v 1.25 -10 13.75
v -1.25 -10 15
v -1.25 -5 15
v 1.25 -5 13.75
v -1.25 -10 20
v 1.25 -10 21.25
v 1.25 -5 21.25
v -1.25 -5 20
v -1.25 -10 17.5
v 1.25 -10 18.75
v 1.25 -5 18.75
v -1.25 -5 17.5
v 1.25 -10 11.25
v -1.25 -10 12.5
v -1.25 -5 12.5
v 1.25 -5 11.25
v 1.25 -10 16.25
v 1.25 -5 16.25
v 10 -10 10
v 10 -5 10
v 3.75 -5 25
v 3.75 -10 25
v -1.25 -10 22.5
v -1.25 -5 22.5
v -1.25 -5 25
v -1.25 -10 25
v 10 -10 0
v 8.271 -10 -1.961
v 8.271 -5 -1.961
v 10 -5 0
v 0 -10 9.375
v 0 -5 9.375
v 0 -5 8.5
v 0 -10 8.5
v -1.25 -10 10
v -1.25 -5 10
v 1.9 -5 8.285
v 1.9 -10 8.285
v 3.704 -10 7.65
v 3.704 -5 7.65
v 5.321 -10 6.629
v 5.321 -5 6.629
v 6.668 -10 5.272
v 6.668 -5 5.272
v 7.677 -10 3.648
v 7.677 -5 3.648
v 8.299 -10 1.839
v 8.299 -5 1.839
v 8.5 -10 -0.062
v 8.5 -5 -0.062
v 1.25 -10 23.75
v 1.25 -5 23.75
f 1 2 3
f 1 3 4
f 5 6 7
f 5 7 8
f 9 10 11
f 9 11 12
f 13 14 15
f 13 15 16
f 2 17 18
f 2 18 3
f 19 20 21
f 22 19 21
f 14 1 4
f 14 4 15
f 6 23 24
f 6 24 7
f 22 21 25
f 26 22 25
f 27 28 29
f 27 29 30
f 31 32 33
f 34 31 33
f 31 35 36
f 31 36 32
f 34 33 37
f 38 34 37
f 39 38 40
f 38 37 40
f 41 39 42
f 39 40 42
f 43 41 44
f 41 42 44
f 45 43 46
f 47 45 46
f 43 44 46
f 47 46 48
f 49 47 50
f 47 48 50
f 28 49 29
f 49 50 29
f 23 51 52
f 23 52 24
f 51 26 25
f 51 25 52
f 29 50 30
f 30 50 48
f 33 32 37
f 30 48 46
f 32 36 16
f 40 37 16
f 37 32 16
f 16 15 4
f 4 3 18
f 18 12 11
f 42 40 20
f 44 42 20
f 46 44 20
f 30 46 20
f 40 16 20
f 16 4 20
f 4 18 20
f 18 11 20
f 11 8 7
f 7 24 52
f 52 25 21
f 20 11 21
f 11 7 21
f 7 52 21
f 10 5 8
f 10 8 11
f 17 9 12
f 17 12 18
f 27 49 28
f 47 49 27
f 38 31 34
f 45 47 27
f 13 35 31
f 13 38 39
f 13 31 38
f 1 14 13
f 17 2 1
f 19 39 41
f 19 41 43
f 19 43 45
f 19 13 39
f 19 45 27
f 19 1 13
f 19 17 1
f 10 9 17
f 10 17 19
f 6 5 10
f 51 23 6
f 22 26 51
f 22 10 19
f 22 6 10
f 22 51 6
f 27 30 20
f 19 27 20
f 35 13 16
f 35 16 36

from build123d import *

# Parameters (mm, degrees)
F1_DEPTH      = 5
F3_DEPTH      = 5
F3_DEPTH_BACK = 5
F4_R          = 2.5
F5_DEPTH      = 5.001
F12_W         = 57.105852
F12_H         = 43.326581
F13_DEPTH     = 5


with BuildPart() as f1:
    # F0 (on Front) → F1 (new body)
    with BuildSketch(Plane.XZ):
        with BuildLine():
            Line((0, 9.13175), (0, 7.5))
            ThreePointArc((0, 7.5), (-6.835784, -3.085784), (5.625, -4.960784))
            Line((5.625, -4.960784), (10, 0))
            Line((10, 0), (10, 10))
            Line((10, 10), (3.75, 25))
            Line((3.75, 25), (1.25, 25))
            Line((1.25, 25), (1.25, 10))
            Line((1.25, 10), (0, 9.13175))
        make_face()
    extrude(amount=F1_DEPTH)

    # F2 (on face) → F3 (join, two sides)
    with BuildSketch(Plane.XZ.offset(5)) as f3_sk:
        with BuildLine():
            Line((3.75, 25), (1.25, 25))
            Line((1.25, 25), (1.25, 23.75))
            Line((1.25, 23.75), (-1.25, 22.5))
            Line((-1.25, 22.5), (1.25, 21.25))
            Line((1.25, 21.25), (-1.25, 20))
            Line((-1.25, 20), (1.25, 18.75))
            Line((1.25, 18.75), (-1.25, 17.5))
            Line((-1.25, 17.5), (1.25, 16.25))
            Line((1.25, 16.25), (-1.25, 15))
            Line((-1.25, 15), (1.25, 13.75))
            Line((1.25, 13.75), (-1.25, 12.5))
            Line((-1.25, 12.5), (1.25, 11.25))
            Line((1.25, 11.25), (-1.25, 10))
            Line((-1.25, 10), (0, 9.375))
            Line((0, 9.375), (0, 9.13175))
            Line((0, 9.13175), (0, 8.5))
            ThreePointArc((0, 8.5), (6.667708, 5.27178), (8.270751, -1.960784))
            Line((8.270751, -1.960784), (10, 0))
            Line((10, 0), (10, 10))
            Line((10, 10), (3.75, 25))
        make_face()
        Polygon((1.25, 23.75), (1.25, 25), (-1.25, 25), align=None)
    extrude(amount=F3_DEPTH)
    extrude(f3_sk.sketch, amount=-F3_DEPTH_BACK)

    # F4 (on face) → F5 (cut, through all)
    with BuildSketch(Plane.XZ.offset(5)):
        Circle(F4_R)
    extrude(amount=-F5_DEPTH, mode=Mode.SUBTRACT)

    # F12 (on face) → F13 (cut)
    with BuildSketch(Plane.XZ):
        with Locations((-1.16475, 8.679668)):
            Rectangle(F12_W, F12_H)
    extrude(amount=F13_DEPTH, mode=Mode.SUBTRACT)


with BuildPart() as f6_1:
    # F6: copy of F1
    add(f1.part)


with BuildPart() as f8_1:
    # F8: copy of F1
    add(f1.part.moved(Location((20, 0, 0))))


with BuildPart() as f10_1:
    # F10: copy of F1
    add(f1.part)


solid = f1.part
